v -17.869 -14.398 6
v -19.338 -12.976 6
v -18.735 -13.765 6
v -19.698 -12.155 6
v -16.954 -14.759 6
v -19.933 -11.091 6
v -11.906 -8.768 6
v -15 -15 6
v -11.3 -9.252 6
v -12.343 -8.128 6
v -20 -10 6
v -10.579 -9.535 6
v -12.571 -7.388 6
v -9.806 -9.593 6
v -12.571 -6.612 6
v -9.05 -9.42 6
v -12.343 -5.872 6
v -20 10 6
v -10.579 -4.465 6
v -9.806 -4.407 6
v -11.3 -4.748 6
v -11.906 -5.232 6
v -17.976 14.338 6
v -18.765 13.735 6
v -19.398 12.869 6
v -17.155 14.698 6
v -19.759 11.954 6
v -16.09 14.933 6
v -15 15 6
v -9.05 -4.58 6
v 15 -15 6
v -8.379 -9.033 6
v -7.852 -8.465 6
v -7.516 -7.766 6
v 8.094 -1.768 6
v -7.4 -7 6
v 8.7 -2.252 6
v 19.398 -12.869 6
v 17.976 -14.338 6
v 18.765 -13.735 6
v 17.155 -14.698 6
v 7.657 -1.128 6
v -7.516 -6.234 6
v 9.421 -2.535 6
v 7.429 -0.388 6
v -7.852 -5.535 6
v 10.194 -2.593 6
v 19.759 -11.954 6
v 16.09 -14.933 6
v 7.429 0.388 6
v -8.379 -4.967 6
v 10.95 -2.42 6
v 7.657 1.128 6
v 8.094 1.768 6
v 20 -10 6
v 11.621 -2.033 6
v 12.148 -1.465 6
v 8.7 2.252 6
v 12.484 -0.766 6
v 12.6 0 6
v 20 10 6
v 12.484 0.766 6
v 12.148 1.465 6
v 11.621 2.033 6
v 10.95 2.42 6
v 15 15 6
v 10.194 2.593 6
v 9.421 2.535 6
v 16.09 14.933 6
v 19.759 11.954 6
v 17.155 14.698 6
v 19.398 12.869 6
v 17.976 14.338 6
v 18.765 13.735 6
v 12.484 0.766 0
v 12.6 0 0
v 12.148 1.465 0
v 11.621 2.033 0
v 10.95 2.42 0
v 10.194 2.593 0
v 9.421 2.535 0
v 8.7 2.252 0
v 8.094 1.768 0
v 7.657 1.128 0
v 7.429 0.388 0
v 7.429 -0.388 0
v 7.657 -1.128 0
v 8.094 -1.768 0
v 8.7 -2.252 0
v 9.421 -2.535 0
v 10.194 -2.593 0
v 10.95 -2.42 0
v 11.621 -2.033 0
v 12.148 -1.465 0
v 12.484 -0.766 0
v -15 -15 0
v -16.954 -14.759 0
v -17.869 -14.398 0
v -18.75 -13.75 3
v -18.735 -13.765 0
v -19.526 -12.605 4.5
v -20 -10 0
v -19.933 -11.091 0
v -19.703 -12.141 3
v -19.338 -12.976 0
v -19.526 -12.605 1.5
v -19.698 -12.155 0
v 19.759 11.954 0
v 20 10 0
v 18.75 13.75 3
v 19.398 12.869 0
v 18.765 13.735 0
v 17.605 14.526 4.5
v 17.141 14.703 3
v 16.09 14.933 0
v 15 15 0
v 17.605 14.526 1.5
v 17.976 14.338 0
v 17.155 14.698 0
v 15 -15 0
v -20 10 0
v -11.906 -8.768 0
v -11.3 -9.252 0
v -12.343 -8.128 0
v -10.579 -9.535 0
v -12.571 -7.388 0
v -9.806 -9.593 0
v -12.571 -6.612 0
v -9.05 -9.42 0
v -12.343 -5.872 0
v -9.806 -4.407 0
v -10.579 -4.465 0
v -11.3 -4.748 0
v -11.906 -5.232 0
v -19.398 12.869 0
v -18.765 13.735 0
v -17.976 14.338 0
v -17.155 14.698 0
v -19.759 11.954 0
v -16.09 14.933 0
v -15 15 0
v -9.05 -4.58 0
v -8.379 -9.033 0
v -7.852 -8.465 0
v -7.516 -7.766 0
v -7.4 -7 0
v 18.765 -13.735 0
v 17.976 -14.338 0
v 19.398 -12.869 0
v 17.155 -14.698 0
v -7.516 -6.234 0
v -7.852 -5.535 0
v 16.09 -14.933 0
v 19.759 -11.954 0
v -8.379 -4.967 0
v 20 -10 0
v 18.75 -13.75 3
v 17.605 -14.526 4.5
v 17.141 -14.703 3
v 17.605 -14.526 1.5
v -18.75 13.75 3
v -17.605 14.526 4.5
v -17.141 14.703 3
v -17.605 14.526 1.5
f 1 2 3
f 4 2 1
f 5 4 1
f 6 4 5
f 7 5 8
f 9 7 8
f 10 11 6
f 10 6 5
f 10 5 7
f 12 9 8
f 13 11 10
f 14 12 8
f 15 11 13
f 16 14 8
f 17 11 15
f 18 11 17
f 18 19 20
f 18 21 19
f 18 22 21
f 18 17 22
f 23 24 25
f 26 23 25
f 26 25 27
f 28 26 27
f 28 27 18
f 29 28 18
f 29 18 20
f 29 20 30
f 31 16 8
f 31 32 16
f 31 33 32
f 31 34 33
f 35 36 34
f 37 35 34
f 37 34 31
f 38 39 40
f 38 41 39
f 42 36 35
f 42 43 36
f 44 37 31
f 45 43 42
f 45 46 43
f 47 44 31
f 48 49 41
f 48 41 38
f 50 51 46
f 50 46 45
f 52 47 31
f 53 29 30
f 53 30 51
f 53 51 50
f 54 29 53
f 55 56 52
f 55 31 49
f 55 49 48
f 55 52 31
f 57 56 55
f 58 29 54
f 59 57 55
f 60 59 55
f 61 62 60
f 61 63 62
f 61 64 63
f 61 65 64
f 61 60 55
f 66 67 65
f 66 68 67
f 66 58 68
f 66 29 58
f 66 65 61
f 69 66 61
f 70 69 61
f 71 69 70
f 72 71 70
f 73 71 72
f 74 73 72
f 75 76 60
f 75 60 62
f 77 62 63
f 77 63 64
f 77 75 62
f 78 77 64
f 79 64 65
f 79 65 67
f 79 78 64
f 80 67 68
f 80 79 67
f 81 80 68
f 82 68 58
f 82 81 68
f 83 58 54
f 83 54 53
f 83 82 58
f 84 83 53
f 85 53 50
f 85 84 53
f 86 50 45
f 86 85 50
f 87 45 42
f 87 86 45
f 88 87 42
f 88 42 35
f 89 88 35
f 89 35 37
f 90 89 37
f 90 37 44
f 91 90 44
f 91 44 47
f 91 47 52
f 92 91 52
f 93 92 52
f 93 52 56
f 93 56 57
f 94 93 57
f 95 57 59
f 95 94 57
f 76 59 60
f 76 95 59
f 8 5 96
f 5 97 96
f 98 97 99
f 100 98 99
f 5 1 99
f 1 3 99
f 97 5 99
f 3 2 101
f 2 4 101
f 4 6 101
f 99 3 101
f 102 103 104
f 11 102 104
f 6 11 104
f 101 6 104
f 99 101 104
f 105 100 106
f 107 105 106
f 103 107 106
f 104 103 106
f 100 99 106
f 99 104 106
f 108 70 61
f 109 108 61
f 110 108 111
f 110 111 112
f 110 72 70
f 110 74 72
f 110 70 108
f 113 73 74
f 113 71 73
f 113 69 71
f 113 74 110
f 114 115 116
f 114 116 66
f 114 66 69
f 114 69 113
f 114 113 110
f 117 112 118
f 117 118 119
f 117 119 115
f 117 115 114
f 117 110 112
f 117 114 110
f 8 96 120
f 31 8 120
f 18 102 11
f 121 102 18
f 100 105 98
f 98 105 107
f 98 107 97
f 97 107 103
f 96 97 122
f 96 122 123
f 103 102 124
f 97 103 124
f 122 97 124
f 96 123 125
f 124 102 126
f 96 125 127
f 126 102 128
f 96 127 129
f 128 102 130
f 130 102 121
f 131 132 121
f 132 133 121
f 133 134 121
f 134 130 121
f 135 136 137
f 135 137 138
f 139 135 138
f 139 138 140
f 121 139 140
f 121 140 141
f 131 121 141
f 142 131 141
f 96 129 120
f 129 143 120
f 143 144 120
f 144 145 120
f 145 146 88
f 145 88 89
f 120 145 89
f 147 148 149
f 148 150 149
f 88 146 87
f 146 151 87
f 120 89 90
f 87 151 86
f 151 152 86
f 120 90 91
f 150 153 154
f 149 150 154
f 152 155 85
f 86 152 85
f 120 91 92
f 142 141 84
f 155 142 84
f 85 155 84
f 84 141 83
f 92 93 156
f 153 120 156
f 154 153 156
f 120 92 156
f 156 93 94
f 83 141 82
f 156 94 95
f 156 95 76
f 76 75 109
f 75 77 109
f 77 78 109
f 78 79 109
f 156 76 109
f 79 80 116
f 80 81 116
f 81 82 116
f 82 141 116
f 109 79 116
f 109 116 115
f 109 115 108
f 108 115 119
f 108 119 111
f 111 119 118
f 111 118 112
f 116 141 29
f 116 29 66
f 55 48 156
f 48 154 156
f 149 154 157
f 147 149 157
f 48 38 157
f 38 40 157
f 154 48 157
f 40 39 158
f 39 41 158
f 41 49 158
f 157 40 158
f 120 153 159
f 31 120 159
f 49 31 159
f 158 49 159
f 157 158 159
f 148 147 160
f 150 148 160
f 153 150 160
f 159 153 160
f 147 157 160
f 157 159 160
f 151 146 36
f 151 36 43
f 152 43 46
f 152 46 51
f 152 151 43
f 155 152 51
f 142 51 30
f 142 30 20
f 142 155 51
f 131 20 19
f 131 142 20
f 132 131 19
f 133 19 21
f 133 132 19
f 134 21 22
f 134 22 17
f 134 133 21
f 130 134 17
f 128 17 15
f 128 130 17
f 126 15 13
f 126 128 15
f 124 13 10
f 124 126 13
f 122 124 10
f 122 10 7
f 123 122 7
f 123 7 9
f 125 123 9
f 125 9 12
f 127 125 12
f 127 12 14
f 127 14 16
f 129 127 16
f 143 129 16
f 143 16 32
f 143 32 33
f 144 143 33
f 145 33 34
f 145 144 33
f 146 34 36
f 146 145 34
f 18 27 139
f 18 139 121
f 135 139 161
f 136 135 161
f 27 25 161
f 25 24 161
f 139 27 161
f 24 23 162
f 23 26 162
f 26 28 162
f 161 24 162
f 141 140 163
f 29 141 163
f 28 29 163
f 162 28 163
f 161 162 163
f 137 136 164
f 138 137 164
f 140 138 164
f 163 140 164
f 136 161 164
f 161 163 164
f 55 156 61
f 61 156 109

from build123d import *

# Parameters (mm, degrees)
F0_W        = 40
F0_H        = 30
F0_R        = 2.6
F1_DEPTH    = 6
F2_T1_DEPTH = 31


# Not quite as in the source:
# - a fillet or chamfer that OpenCascade refuses, or shapes differently, is made with other operations: its cross-section is extruded or revolved along the edge and cut away or added


with BuildPart() as f1:
    # F0 (on Top) → F1 (new body)
    with BuildSketch(Plane.XY):
        Rectangle(F0_W, F0_H)
        with Locations((-10, -7)):
            Circle(F0_R, mode=Mode.SUBTRACT)
        with Locations((10, 0)):
            Circle(F0_R, mode=Mode.SUBTRACT)
    extrude(amount=F1_DEPTH)

    # F2: fillet of radius 5 on 4 edges, made by hand

    # F2_s2 → F2_t1 (cut)
    with BuildSketch(Plane.XY.offset(-12.5)):
        with BuildLine():
            add(Edge.make_bspline(
                [(-20, -10), (-20, -15), (-15, -15)],
                knots=[0, 0, 0, 1, 1, 1], degree=2, weights=[1, 1, 1]))
            Line((-15, -15), (-20, -15))
            Line((-20, -15), (-20, -10))
        make_face()
        with BuildLine():
            add(Edge.make_bspline(
                [(15, -15), (20, -15), (20, -10)],
                knots=[0, 0, 0, 1, 1, 1], degree=2, weights=[1, 1, 1]))
            Line((20, -10), (20, -15))
            Line((20, -15), (15, -15))
        make_face()
        with BuildLine():
            add(Edge.make_bspline(
                [(15, 15), (20, 15), (20, 10)],
                knots=[0, 0, 0, 1, 1, 1], degree=2, weights=[1, 1, 1]))
            Line((20, 10), (20, 15))
            Line((20, 15), (15, 15))
        make_face()
        with BuildLine():
            add(Edge.make_bspline(
                [(-15, 15), (-20, 15), (-20, 10)],
                knots=[0, 0, 0, 1, 1, 1], degree=2, weights=[1, 1, 1]))
            Line((-20, 10), (-20, 15))
            Line((-20, 15), (-15, 15))
        make_face()
    extrude(amount=F2_T1_DEPTH, mode=Mode.SUBTRACT)


solid = f1.part
